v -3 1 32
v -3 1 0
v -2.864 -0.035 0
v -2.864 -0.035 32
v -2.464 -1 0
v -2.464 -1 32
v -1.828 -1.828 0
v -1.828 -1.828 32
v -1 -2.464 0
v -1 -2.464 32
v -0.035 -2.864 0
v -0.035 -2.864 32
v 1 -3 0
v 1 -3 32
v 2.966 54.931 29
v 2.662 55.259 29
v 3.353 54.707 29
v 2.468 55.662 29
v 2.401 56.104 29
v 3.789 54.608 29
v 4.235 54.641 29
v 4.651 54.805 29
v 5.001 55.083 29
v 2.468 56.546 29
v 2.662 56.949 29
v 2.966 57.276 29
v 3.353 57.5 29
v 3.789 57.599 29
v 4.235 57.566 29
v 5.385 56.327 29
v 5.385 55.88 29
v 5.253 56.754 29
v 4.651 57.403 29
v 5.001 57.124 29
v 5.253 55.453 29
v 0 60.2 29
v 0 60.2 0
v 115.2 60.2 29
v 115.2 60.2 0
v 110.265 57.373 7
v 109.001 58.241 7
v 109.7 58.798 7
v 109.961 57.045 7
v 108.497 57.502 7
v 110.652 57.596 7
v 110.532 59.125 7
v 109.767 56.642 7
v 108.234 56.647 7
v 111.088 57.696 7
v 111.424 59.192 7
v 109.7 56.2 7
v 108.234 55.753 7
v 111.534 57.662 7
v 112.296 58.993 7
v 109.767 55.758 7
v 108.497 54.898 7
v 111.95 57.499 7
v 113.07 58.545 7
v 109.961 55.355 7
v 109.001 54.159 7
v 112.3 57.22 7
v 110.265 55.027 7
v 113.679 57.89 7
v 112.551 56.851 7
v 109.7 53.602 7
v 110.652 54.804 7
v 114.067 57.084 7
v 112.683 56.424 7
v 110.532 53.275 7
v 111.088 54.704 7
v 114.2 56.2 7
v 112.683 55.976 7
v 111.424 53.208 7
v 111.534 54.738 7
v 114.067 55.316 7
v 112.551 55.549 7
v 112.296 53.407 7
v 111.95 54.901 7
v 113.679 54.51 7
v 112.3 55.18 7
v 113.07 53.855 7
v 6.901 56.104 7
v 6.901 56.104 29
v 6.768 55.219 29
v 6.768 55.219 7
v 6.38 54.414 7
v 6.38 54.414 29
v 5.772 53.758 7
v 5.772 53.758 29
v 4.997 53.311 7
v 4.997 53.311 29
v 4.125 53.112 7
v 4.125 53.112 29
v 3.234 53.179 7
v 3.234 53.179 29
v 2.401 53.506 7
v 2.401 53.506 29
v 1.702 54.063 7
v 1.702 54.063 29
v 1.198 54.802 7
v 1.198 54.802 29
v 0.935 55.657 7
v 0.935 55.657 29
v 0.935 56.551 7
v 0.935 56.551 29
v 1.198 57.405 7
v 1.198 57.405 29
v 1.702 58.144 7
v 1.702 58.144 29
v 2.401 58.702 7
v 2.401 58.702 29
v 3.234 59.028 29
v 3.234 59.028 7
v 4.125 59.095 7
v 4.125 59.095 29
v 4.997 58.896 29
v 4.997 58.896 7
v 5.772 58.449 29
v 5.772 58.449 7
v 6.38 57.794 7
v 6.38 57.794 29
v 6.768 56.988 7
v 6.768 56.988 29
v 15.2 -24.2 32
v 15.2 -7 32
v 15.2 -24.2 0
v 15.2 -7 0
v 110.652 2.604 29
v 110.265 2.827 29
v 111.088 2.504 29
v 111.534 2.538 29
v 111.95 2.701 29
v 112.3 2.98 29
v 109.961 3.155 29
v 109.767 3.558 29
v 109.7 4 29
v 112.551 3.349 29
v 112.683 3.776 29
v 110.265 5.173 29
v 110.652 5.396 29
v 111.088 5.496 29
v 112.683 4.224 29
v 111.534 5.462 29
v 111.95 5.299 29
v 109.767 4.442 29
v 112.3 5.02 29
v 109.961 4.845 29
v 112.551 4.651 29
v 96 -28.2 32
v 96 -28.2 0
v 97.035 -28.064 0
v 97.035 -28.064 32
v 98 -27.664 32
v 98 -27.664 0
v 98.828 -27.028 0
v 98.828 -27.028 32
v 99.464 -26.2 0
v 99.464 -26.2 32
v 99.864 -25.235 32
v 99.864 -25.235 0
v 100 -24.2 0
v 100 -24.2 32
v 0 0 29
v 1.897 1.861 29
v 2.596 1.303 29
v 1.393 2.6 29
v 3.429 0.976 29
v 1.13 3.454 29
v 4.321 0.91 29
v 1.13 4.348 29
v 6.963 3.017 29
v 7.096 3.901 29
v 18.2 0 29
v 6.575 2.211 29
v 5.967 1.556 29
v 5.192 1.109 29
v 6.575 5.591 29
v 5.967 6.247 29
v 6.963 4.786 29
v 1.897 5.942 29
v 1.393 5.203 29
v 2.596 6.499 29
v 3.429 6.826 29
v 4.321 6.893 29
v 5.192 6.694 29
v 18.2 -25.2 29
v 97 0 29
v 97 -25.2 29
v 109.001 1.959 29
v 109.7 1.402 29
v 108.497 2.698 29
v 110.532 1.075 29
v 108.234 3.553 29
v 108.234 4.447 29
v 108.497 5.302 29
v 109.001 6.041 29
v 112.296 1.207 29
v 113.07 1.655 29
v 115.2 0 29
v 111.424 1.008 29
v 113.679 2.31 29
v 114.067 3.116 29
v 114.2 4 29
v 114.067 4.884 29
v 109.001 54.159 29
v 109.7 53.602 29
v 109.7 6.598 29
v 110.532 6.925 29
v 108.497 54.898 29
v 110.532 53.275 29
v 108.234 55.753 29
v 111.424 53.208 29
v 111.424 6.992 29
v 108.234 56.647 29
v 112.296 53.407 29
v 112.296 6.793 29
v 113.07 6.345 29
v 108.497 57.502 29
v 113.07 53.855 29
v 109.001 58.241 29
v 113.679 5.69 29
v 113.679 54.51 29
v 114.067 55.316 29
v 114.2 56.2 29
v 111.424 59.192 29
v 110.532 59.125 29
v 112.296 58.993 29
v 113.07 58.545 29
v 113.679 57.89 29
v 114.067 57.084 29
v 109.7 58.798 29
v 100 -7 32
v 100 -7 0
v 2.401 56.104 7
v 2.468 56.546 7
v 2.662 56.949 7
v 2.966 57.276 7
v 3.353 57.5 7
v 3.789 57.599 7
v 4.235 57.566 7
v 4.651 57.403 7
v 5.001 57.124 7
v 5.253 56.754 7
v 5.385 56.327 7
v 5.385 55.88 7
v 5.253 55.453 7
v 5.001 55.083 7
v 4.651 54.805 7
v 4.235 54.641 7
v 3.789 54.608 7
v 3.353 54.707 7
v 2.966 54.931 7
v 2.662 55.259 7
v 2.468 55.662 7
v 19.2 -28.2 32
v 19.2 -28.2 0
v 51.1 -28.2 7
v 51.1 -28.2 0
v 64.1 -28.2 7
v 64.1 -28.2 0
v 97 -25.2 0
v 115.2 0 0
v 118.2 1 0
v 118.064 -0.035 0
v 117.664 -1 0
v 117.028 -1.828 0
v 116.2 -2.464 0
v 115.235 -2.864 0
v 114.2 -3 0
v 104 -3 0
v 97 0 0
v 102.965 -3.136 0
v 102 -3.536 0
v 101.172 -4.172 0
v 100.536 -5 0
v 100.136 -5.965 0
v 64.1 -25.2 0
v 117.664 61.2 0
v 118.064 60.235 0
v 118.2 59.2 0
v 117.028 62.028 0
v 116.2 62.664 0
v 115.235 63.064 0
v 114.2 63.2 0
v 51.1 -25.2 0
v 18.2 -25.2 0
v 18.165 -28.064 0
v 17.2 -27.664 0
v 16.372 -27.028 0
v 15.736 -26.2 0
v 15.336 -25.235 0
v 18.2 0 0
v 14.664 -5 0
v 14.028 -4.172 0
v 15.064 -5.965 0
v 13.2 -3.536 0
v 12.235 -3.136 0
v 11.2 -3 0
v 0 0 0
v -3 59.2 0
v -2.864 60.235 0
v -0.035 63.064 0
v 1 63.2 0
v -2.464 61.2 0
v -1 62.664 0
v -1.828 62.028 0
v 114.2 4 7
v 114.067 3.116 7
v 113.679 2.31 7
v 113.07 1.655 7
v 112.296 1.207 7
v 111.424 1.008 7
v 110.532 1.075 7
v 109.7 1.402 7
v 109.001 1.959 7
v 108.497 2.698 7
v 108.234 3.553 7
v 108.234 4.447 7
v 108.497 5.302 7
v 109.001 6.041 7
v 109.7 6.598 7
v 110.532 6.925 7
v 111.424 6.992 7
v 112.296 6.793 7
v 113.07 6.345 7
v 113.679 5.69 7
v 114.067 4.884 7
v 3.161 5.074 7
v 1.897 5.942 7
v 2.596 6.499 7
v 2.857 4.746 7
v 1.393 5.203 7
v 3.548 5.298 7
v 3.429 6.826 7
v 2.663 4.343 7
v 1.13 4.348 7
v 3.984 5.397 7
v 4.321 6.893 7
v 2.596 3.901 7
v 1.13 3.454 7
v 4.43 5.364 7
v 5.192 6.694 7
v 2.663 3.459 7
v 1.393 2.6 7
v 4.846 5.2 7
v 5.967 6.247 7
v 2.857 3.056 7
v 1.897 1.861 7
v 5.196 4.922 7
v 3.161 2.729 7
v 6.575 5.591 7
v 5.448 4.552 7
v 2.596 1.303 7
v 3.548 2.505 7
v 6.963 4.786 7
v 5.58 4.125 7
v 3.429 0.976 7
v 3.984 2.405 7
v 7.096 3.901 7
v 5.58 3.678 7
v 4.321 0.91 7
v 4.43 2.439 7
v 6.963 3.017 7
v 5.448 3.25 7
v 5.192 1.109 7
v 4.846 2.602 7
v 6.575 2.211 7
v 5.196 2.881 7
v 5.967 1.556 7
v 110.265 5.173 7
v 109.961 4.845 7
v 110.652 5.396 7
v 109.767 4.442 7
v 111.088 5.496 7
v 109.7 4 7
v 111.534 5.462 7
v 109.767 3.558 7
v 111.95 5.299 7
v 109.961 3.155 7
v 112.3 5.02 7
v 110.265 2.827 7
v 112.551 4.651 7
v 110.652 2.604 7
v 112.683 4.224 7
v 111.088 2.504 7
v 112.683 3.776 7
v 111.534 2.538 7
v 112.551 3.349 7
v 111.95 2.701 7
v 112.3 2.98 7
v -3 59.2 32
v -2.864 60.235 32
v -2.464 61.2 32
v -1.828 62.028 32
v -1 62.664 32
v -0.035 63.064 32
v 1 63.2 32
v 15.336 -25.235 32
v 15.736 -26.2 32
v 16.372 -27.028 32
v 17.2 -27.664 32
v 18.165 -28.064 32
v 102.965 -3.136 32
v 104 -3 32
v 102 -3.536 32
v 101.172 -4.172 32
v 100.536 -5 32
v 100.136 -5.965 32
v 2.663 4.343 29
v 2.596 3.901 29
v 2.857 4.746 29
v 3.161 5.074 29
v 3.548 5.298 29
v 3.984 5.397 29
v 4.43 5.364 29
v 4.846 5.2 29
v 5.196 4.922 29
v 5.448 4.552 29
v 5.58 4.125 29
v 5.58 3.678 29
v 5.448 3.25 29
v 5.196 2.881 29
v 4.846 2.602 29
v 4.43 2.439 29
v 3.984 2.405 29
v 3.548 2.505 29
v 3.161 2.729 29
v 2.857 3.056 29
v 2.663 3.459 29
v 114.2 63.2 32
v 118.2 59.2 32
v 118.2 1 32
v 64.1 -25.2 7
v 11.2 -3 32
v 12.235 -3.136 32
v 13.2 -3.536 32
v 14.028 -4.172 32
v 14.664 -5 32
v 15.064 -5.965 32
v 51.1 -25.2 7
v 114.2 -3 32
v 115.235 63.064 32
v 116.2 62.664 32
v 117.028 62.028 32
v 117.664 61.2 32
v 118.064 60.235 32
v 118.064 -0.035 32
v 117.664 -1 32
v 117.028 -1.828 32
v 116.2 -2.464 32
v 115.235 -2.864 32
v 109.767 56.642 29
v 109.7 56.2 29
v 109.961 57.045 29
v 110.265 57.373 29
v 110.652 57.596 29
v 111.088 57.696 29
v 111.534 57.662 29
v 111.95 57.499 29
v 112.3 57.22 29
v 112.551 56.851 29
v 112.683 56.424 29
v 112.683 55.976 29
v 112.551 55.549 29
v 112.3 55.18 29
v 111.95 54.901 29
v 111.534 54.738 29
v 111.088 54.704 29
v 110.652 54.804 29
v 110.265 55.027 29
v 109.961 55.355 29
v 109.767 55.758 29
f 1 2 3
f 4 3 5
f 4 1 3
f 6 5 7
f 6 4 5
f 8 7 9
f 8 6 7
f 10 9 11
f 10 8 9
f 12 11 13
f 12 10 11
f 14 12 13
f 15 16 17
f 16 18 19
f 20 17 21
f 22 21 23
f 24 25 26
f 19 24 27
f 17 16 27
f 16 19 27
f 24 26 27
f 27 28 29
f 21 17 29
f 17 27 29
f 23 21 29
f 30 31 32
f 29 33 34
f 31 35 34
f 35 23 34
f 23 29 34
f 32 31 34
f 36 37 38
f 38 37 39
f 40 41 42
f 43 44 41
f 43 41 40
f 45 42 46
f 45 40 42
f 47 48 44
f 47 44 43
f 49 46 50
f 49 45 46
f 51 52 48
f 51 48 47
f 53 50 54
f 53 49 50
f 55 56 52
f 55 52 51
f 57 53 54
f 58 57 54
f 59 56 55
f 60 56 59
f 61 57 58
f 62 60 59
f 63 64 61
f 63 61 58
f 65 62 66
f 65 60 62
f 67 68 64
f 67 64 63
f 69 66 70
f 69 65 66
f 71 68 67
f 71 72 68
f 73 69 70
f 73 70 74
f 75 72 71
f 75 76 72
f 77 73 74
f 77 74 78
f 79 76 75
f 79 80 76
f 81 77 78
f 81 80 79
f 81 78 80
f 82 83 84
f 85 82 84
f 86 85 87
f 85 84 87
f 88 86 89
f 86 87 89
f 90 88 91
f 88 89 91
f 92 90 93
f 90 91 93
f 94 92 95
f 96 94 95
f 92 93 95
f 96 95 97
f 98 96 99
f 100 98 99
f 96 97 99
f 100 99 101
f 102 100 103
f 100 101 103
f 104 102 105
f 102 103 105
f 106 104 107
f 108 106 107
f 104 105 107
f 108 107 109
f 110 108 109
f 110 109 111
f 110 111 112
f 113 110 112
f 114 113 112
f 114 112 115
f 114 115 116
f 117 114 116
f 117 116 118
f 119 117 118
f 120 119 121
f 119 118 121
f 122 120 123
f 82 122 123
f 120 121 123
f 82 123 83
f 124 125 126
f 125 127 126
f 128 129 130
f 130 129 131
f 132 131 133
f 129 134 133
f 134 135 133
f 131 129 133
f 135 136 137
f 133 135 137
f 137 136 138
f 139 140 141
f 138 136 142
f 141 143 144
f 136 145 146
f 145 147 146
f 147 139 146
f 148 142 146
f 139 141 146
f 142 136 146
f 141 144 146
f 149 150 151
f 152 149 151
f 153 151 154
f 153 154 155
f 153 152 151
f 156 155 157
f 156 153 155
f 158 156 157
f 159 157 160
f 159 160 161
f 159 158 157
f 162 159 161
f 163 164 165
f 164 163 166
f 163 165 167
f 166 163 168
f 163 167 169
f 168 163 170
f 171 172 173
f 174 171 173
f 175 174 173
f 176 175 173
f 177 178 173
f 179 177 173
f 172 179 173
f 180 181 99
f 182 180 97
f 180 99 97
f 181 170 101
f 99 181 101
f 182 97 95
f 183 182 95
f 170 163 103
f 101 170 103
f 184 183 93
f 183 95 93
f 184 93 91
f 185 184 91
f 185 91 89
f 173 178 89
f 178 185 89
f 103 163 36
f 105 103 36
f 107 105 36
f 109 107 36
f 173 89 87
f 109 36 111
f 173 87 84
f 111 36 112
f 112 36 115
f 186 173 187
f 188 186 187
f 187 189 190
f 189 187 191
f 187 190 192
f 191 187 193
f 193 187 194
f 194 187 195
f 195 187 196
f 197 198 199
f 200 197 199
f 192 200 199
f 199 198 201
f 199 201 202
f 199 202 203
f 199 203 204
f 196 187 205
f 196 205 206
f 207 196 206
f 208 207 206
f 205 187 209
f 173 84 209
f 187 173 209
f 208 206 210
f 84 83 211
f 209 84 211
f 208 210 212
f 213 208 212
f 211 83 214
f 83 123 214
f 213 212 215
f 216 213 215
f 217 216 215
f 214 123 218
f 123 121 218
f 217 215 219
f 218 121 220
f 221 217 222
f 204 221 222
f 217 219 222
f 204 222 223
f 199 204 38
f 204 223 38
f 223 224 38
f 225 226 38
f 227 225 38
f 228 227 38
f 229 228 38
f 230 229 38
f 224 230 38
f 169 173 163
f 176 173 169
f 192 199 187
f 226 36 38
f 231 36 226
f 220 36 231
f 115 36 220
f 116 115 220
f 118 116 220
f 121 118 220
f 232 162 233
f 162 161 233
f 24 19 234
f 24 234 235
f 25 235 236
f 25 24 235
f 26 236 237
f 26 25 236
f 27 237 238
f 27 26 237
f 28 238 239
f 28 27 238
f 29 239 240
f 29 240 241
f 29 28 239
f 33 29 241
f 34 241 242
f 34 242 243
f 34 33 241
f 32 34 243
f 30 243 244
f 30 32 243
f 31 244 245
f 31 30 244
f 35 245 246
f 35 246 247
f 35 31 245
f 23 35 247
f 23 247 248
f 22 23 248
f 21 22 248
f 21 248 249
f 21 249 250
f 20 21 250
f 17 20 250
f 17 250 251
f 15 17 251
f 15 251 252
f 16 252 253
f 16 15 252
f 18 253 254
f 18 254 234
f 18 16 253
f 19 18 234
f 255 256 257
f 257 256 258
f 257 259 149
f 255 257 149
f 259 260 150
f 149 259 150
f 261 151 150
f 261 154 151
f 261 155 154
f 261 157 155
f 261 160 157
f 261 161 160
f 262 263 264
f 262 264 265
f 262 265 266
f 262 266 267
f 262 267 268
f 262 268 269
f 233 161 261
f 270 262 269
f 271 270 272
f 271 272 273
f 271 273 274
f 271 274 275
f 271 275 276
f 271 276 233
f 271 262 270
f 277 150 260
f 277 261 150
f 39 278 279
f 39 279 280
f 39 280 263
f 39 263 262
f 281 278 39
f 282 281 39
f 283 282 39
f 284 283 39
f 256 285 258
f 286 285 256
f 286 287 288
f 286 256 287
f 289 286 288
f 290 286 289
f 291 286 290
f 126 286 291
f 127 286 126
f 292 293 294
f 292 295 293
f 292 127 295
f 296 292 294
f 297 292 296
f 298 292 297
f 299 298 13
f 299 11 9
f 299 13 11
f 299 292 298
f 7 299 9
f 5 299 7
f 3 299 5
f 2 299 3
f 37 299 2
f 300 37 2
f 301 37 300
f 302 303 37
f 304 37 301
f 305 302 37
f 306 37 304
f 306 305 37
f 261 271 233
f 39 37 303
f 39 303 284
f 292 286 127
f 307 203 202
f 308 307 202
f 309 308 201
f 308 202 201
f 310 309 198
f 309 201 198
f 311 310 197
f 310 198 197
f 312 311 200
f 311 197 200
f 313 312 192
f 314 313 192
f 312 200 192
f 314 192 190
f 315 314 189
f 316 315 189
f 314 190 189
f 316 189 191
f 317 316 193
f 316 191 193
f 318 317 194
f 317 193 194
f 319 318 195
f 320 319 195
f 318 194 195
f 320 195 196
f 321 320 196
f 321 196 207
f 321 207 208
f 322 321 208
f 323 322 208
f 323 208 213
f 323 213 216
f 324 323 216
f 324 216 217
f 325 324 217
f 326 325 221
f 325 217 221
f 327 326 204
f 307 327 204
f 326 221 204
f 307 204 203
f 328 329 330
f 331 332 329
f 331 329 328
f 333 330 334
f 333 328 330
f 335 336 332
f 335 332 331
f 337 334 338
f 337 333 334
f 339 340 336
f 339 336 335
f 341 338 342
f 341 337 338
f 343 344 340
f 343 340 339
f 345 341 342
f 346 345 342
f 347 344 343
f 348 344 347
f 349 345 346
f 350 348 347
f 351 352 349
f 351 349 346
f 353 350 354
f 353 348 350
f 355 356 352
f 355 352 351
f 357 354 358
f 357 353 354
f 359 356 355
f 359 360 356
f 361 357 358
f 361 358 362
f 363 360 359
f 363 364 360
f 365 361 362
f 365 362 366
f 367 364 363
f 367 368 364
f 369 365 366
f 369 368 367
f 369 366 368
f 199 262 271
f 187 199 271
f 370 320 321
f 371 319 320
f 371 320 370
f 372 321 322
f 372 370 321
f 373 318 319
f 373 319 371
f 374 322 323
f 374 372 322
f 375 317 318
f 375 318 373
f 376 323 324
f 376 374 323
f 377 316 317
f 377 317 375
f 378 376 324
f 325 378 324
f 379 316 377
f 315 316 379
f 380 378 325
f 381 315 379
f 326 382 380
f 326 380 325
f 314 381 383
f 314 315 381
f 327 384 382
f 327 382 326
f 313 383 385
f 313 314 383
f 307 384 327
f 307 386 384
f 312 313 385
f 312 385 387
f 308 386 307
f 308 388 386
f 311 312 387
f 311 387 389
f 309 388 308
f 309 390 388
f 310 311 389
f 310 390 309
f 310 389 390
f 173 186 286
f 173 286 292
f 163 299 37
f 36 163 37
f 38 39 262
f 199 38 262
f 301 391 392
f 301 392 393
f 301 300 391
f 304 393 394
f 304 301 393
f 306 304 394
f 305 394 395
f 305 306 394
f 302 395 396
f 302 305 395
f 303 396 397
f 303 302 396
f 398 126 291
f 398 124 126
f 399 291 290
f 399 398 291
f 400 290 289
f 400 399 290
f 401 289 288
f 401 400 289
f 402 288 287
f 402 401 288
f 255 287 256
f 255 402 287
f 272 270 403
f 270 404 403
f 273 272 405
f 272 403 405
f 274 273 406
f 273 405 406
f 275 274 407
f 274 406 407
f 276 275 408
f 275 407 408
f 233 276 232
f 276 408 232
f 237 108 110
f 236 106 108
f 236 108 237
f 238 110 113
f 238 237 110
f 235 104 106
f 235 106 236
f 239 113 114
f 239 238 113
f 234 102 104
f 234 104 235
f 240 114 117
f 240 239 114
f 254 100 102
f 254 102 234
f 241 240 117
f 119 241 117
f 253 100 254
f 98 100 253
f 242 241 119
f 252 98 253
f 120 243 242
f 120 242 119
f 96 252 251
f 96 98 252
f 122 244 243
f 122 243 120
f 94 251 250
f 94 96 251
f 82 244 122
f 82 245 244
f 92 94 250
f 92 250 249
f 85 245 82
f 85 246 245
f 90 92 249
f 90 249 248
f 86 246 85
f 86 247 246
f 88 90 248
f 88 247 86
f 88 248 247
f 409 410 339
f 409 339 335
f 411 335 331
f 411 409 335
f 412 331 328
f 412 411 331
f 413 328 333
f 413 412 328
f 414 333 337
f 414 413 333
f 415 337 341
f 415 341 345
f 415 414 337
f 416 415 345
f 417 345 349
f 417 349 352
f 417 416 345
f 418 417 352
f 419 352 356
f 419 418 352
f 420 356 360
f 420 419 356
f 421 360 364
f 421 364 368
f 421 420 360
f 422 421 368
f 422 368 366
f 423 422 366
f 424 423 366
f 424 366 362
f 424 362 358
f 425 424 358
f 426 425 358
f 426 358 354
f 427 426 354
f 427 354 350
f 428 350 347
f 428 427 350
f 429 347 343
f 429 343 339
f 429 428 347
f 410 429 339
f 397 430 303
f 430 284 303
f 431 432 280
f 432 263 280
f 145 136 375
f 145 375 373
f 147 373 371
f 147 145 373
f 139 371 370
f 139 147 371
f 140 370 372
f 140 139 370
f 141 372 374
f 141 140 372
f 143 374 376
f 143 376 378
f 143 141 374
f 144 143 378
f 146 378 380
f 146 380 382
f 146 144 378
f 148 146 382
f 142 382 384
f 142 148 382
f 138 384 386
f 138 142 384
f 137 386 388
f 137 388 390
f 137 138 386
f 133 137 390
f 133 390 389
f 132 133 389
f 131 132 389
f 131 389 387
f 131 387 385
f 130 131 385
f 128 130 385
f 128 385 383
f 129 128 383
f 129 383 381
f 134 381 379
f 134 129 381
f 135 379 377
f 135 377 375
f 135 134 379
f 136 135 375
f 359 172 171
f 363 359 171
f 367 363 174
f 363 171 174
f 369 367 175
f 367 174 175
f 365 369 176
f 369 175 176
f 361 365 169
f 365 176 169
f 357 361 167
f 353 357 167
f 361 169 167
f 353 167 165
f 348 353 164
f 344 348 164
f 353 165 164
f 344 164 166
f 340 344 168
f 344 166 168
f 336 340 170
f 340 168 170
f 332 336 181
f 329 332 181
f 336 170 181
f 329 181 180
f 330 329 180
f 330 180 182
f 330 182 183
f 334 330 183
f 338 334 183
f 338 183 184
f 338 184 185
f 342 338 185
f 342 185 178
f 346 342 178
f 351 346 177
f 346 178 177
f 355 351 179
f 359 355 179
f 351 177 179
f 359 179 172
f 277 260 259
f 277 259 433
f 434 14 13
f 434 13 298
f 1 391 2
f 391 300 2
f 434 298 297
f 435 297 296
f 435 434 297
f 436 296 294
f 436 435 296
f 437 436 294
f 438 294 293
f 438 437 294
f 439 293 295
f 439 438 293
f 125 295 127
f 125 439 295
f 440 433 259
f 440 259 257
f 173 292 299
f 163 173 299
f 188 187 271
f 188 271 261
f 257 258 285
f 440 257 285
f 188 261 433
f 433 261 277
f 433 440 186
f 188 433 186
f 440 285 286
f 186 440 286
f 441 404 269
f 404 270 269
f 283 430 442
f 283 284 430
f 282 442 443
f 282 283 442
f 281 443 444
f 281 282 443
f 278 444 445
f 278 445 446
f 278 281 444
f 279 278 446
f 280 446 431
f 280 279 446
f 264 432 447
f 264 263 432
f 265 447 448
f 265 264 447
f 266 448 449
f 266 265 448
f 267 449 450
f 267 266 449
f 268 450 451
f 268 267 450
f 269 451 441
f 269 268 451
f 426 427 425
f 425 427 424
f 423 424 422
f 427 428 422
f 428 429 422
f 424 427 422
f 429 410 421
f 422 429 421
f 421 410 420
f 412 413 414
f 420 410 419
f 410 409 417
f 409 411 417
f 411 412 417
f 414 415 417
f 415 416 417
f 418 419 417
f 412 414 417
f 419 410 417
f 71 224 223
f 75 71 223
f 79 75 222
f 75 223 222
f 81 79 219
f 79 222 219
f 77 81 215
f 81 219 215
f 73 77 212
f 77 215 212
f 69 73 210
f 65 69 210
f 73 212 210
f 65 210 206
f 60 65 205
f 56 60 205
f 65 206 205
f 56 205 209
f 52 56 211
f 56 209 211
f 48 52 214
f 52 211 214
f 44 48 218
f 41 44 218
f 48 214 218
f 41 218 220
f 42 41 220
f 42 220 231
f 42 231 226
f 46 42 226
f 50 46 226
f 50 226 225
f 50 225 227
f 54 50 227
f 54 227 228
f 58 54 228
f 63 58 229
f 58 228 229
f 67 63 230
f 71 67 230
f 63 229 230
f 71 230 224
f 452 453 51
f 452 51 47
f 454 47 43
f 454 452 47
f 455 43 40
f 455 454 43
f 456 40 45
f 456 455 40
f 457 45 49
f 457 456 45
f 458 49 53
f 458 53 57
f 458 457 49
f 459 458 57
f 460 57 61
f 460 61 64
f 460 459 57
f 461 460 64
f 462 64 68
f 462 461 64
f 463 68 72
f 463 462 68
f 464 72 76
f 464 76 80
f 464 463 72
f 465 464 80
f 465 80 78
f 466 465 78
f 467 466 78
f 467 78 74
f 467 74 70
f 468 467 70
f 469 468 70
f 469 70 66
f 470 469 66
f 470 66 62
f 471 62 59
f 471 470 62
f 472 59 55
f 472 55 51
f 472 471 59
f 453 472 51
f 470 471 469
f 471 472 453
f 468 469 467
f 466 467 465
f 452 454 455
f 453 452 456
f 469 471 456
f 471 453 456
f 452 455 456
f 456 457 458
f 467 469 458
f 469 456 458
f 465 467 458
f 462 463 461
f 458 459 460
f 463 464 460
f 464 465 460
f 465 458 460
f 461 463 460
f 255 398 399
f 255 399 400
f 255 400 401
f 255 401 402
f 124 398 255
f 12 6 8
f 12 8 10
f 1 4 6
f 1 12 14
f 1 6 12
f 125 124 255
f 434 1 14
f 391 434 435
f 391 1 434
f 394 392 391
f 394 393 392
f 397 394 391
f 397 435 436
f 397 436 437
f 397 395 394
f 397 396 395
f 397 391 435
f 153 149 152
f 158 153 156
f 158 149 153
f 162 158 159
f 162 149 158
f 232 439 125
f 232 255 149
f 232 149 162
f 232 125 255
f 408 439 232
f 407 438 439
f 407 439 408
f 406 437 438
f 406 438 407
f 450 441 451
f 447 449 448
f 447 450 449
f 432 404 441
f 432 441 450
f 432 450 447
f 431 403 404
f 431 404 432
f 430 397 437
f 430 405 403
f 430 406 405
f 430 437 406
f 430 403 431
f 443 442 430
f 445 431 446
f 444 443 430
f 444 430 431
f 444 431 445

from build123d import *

# Parameters (mm, degrees)
DODANIE_WYCI_GNI_CIE1_DEPTH = 29
DODANIE_WYCI_GNI_CIE2_DEPTH = 3
SZKIC3_R                    = 3
SZKIC3_R_2                  = 1.5
DODANIE_WYCI_GNI_CIE3_DEPTH = 22
SZKIC5_W                    = 13
SZKIC5_H                    = 6
WYTNIJ_WYCI_GNI_CIE1_DEPTH  = 7
ZAOKR_GLENIE1_R             = 4
ZAOKR_GLENIE2_R             = 4


with BuildPart() as part:
    # Szkic1 → Dodanie-wyciągnięcie1 (new body)
    with BuildSketch(Plane.XY):
        Polygon((-1.456531899, 63.2), (118.2, 63.2), (118.2, -3), (100, -3), (100, -28.2), (15.2, -28.2), (15.2, -3), (-3, -3), (-3, 63.2), align=None)
        Polygon((0, 0), (0, 60.2), (115.2, 60.2), (115.2, 0), (97, 0), (97, -25.2), (18.2, -25.2), (18.2, 0), align=None, mode=Mode.SUBTRACT)
    extrude(amount=DODANIE_WYCI_GNI_CIE1_DEPTH)

    # Szkic2 → Dodanie-wyciągnięcie2 (add)
    with BuildSketch(Plane.XY.offset(29)):
        Polygon((-3, 63.2), (-3, -3), (15.2, -3), (15.2, -28.2), (100, -28.2), (100, -3), (118.2, -3), (118.2, 63.2), align=None)
    extrude(amount=DODANIE_WYCI_GNI_CIE2_DEPTH)

    # Szkic3 → Dodanie-wyciągnięcie3 (add)
    # profile 1 of 4: a face of its own
    with BuildSketch(Plane(origin=(0, 0, 29), x_dir=(-1, 0, 0), z_dir=(0, 0, -1))):
        with Locations(Location((-111.2, 4, 0), (0, 0, 180))):
            Circle(SZKIC3_R)
        with Locations((-111.2, 4)):
            Circle(SZKIC3_R_2, mode=Mode.SUBTRACT)
    # profile 2 of 4: a face of its own
    with BuildSketch(Plane(origin=(0, 0, 29), x_dir=(-1, 0, 0), z_dir=(0, 0, -1))):
        with Locations(Location((-111.2, 56.2, 0), (0, 0, 180))):
            Circle(SZKIC3_R)
        with Locations((-111.2, 56.2)):
            Circle(SZKIC3_R_2, mode=Mode.SUBTRACT)
    # profile 3 of 4: a face of its own
    with BuildSketch(Plane(origin=(0, 0, 29), x_dir=(-1, 0, 0), z_dir=(0, 0, -1))):
        with Locations(Location((-3.901278793, 56.103657268, 0), (0, 0, 180))):
            Circle(SZKIC3_R)
        with Locations((-3.901278793, 56.103657268)):
            Circle(SZKIC3_R_2, mode=Mode.SUBTRACT)
    # profile 4 of 4: a face of its own
    with BuildSketch(Plane(origin=(0, 0, 29), x_dir=(-1, 0, 0), z_dir=(0, 0, -1))):
        with Locations(Location((-4.096342732, 3.901278793, 0), (0, 0, 180))):
            Circle(SZKIC3_R)
        with Locations((-4.096342732, 3.901278793)):
            Circle(SZKIC3_R_2, mode=Mode.SUBTRACT)
    extrude(amount=DODANIE_WYCI_GNI_CIE3_DEPTH)

    # Szkic5 → Wytnij-wyciągnięcie1 (cut)
    with BuildSketch(Plane(origin=(0, 0, 0), x_dir=(-1, 0, 0), z_dir=(0, 0, -1))):
        with Locations((-57.6, -25.2)):
            Rectangle(SZKIC5_W, SZKIC5_H)
    extrude(amount=-WYTNIJ_WYCI_GNI_CIE1_DEPTH, mode=Mode.SUBTRACT)

    # Zaokrąglenie1
    zaokr_glenie1_edges = [part.edges().sort_by_distance(p)[0] for p in [
        (118.2, 63.2, 16),
        (118.2, -3, 16),
        (100, -28.2, 16),
        (15.2, -28.2, 16),
        (-3, -3, 16),
        (-3, 63.2, 16),
    ]]
    fillet(zaokr_glenie1_edges, radius=ZAOKR_GLENIE1_R)

    # Zaokrąglenie2
    zaokr_glenie2_edges = [part.edges().sort_by_distance(p)[0] for p in [
        (100, -3, 16),
        (15.2, -3, 16),
    ]]
    fillet(zaokr_glenie2_edges, radius=ZAOKR_GLENIE2_R)


solid = part.part
